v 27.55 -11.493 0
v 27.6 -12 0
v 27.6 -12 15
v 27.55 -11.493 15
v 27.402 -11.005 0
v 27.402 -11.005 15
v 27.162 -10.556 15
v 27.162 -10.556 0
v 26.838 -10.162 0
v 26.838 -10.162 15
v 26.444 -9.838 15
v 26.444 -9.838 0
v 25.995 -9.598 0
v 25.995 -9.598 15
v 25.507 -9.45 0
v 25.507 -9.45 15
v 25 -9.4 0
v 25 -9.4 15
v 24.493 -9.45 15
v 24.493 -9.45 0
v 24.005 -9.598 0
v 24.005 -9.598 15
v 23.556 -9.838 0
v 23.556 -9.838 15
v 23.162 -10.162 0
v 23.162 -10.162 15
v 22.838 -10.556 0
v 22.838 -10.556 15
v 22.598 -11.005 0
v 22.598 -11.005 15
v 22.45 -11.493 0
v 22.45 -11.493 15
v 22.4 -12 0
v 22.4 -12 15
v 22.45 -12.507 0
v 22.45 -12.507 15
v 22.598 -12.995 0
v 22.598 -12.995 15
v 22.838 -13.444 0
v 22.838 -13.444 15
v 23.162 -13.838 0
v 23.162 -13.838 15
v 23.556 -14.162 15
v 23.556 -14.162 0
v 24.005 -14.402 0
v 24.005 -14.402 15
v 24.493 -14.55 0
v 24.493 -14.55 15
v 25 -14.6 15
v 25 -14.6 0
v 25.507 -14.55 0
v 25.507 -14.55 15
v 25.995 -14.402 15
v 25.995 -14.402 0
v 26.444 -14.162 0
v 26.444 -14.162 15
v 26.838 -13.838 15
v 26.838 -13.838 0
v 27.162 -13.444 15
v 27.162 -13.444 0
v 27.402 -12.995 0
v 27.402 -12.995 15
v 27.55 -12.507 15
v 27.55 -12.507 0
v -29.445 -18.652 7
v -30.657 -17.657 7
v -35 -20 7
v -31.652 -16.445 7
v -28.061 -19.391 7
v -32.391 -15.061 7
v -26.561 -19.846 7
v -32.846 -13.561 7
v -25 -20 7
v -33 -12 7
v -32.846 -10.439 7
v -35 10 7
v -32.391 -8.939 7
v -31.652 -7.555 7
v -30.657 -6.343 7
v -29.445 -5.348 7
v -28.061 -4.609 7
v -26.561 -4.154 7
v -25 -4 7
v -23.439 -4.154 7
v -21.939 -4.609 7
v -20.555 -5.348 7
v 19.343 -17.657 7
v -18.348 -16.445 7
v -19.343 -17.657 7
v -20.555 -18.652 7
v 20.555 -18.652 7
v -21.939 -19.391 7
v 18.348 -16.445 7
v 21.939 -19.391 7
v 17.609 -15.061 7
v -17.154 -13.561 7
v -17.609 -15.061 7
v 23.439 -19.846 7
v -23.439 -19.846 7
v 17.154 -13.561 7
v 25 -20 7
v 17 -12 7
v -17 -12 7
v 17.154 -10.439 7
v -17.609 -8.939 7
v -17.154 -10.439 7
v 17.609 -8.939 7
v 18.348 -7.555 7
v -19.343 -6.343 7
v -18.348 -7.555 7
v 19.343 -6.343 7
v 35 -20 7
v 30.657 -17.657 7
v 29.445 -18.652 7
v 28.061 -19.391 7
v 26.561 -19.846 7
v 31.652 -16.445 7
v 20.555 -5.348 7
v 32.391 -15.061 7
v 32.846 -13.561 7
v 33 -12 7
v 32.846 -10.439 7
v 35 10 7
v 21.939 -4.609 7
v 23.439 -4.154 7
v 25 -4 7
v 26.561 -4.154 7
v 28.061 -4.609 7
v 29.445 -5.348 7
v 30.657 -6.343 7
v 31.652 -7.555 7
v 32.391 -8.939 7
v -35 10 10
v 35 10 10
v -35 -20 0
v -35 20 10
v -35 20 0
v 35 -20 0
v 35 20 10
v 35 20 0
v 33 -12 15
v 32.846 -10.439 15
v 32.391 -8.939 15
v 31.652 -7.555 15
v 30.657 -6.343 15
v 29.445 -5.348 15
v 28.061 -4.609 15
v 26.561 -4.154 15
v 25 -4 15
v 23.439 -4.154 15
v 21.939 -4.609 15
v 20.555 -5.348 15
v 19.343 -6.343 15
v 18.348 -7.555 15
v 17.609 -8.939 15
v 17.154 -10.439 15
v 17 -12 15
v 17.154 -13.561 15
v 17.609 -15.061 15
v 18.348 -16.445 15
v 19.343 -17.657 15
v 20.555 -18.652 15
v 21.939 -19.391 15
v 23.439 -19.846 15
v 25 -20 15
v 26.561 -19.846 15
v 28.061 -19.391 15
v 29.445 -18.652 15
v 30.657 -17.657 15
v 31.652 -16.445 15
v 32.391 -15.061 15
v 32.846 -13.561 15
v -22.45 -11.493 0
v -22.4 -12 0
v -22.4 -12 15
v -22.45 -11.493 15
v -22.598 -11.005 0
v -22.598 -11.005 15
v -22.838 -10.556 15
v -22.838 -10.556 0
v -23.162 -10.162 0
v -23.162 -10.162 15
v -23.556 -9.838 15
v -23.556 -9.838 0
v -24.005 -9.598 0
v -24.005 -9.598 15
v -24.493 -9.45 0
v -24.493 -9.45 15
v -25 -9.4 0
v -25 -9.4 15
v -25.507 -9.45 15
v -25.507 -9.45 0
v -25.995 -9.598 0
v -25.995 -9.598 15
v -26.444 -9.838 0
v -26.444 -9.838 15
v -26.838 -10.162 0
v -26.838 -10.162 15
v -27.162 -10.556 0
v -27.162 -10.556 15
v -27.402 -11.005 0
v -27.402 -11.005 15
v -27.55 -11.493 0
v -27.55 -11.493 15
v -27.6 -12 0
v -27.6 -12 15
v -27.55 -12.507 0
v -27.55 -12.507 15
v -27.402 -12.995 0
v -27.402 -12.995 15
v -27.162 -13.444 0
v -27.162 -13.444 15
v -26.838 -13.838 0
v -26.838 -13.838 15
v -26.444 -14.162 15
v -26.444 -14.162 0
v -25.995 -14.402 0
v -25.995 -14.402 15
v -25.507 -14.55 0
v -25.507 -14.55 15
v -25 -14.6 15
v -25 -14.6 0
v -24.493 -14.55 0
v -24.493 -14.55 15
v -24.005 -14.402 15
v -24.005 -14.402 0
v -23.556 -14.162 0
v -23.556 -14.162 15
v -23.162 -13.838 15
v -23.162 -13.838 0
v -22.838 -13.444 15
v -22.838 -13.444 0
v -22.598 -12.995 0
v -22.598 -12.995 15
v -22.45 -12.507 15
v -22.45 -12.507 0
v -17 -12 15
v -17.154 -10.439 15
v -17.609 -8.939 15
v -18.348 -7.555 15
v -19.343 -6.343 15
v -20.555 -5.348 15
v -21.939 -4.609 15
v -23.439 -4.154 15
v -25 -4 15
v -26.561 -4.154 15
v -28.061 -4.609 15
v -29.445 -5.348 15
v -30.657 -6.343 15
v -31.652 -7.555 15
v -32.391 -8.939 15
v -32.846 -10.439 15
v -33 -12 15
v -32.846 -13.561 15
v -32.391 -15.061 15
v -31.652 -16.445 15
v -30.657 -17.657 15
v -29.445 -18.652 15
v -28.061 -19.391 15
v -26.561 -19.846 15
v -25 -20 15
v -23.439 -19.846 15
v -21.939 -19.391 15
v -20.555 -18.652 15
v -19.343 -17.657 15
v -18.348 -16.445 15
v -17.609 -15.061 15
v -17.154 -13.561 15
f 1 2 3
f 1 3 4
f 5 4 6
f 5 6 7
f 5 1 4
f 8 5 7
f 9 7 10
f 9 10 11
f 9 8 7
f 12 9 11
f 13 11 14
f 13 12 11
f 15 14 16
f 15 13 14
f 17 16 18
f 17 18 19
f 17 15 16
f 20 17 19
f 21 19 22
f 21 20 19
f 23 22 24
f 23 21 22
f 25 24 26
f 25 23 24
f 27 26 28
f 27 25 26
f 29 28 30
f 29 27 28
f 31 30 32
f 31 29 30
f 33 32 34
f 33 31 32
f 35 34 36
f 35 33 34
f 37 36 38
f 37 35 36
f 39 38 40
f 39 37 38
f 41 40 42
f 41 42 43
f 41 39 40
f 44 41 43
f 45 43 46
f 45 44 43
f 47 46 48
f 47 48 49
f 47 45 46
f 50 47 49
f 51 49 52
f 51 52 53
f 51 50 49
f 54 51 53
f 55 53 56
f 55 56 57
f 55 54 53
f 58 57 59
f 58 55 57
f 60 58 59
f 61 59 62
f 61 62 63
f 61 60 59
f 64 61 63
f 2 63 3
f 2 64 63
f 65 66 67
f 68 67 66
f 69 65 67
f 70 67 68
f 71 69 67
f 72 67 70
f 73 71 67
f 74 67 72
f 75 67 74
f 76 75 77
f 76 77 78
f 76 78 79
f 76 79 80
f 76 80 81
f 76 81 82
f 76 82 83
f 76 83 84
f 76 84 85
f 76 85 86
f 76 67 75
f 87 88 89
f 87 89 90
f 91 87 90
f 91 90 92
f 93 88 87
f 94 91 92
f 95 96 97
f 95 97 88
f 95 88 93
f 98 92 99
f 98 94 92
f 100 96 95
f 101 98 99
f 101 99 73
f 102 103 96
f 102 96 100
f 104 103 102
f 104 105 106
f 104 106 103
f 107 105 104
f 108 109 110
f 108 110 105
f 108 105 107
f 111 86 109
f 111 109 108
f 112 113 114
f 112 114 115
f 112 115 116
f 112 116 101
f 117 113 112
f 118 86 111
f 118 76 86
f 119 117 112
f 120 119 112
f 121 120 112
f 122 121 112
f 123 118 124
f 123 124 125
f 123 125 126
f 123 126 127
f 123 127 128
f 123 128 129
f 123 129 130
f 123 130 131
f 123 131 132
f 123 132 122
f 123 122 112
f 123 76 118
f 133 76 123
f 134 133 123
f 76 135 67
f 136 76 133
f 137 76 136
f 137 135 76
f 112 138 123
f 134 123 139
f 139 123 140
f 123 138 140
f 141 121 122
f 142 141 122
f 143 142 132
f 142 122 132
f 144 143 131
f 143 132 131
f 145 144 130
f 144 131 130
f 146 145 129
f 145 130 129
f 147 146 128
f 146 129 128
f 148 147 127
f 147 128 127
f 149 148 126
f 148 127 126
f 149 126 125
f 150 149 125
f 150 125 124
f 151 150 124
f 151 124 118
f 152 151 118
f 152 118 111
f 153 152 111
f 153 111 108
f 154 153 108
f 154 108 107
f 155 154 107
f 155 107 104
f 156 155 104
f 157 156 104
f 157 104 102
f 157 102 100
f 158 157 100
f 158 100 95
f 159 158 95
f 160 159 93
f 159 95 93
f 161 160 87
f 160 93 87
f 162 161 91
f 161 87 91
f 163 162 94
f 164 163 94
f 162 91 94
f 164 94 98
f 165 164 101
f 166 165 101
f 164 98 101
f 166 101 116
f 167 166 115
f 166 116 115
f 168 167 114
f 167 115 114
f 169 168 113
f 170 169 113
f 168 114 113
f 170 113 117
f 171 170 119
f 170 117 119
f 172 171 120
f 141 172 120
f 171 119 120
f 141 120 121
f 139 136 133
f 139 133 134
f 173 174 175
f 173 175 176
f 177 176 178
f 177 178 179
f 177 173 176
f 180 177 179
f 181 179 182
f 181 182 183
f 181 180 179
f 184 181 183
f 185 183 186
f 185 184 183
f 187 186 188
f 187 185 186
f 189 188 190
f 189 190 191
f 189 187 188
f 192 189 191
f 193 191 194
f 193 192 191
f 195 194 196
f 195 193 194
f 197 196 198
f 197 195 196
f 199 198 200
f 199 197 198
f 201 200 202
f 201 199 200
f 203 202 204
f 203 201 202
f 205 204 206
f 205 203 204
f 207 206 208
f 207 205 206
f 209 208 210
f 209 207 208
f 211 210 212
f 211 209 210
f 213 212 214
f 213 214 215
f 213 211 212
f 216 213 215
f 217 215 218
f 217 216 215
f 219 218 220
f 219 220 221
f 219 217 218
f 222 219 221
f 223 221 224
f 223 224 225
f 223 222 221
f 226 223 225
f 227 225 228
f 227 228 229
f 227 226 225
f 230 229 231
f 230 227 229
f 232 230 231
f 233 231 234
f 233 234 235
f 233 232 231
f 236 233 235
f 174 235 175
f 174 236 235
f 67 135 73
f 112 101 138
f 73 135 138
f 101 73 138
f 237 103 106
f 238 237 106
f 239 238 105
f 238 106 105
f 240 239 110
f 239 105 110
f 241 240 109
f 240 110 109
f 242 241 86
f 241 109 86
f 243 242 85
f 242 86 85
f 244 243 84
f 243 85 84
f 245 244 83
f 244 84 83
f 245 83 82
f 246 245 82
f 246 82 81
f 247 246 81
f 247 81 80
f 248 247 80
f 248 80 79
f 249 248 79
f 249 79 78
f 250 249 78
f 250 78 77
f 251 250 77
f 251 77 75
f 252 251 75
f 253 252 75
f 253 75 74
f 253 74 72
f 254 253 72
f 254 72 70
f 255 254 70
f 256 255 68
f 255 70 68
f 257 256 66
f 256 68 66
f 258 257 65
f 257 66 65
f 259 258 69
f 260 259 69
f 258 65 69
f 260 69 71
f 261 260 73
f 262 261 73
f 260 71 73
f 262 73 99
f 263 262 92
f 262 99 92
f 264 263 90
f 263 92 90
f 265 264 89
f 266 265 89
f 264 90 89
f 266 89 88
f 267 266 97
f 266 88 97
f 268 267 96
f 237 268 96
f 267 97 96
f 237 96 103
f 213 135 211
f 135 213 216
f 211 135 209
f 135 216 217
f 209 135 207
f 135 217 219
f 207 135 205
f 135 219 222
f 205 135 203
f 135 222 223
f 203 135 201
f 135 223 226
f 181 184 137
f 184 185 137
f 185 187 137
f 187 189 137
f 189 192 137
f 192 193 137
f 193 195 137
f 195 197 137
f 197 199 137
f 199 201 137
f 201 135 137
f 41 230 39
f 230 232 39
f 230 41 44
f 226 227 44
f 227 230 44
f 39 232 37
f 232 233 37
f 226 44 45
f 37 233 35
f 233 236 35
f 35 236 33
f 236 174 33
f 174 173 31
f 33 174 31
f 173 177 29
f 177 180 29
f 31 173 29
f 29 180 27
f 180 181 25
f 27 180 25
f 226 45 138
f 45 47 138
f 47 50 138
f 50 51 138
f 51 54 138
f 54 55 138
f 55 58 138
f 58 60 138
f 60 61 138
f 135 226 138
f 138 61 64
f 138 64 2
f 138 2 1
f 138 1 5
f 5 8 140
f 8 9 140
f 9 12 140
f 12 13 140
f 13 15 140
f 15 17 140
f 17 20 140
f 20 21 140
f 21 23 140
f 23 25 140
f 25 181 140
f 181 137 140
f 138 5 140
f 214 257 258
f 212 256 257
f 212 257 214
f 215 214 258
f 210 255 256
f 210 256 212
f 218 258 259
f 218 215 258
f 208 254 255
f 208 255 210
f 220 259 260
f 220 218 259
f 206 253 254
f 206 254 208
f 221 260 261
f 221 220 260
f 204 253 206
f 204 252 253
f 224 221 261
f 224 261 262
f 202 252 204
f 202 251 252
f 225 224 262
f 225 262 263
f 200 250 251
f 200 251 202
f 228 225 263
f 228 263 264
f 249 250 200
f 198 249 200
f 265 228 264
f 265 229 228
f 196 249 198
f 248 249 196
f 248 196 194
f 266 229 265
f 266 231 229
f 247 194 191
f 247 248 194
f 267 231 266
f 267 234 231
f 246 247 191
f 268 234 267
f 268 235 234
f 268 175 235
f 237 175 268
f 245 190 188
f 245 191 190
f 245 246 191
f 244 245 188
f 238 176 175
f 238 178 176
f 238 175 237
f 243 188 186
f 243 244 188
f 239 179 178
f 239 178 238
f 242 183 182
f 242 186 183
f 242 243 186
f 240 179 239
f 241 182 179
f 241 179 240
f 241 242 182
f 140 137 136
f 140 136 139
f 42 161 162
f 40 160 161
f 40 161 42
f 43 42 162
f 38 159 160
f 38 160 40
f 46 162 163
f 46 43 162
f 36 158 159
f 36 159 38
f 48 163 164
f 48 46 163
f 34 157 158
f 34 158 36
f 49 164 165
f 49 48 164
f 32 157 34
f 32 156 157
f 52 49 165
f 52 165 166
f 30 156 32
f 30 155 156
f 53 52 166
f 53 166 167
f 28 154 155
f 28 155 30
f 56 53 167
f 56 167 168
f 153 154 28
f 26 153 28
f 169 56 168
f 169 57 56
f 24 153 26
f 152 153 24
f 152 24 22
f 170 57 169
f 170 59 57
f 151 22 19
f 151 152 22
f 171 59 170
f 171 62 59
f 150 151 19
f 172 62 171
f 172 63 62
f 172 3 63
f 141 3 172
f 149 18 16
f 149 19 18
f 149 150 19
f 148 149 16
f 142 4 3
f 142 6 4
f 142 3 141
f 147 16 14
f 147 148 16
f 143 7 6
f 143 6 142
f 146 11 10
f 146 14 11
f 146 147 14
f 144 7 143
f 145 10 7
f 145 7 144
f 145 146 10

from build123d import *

# Parameters (mm, degrees)
SKETCH001_R      = 8
SKETCH001_R_2    = 2.6
EXTRUDE001_DEPTH = 15
SKETCH_W         = 70
SKETCH_H         = 40
SKETCH_R         = 6
EXTRUDE_DEPTH    = 7
SKETCH002_W      = 70
SKETCH002_H      = 10
EXTRUDE002_DEPTH = 3


with BuildPart() as extrude001:
    # Sketch001 → Extrude001 (new body)
    with BuildSketch(Plane.XY):
        with Locations((-25, -12)):
            Circle(SKETCH001_R)
        with Locations((-25, -12)):
            Circle(SKETCH001_R_2, mode=Mode.SUBTRACT)
        with Locations((25, -12)):
            Circle(SKETCH001_R)
        with Locations((25, -12)):
            Circle(SKETCH001_R_2, mode=Mode.SUBTRACT)
    extrude(amount=EXTRUDE001_DEPTH)


with BuildPart() as extrude_body:
    # Sketch → Extrude (new body)
    with BuildSketch(Plane.XY):
        Rectangle(SKETCH_W, SKETCH_H)
        with Locations((-25, -12)):
            Circle(SKETCH_R, mode=Mode.SUBTRACT)
        with Locations((25, -12)):
            Circle(SKETCH_R, mode=Mode.SUBTRACT)
    extrude(amount=EXTRUDE_DEPTH)


with BuildPart() as fusion:
    # Sketch002 → Extrude002 (new body)
    with BuildSketch(Plane.XY):
        with Locations((0, 15)):
            Rectangle(SKETCH002_W, SKETCH002_H)
    extrude(amount=EXTRUDE002_DEPTH)


with BuildPart() as fusion_1:
    # Extrude002 placement: moved
    add(fusion.part.moved(Location((0, 0, 7))))

    # Fusion: union Extrude001, Extrude body
    add(extrude001.part)
    add(extrude_body.part)


solid = fusion_1.part
